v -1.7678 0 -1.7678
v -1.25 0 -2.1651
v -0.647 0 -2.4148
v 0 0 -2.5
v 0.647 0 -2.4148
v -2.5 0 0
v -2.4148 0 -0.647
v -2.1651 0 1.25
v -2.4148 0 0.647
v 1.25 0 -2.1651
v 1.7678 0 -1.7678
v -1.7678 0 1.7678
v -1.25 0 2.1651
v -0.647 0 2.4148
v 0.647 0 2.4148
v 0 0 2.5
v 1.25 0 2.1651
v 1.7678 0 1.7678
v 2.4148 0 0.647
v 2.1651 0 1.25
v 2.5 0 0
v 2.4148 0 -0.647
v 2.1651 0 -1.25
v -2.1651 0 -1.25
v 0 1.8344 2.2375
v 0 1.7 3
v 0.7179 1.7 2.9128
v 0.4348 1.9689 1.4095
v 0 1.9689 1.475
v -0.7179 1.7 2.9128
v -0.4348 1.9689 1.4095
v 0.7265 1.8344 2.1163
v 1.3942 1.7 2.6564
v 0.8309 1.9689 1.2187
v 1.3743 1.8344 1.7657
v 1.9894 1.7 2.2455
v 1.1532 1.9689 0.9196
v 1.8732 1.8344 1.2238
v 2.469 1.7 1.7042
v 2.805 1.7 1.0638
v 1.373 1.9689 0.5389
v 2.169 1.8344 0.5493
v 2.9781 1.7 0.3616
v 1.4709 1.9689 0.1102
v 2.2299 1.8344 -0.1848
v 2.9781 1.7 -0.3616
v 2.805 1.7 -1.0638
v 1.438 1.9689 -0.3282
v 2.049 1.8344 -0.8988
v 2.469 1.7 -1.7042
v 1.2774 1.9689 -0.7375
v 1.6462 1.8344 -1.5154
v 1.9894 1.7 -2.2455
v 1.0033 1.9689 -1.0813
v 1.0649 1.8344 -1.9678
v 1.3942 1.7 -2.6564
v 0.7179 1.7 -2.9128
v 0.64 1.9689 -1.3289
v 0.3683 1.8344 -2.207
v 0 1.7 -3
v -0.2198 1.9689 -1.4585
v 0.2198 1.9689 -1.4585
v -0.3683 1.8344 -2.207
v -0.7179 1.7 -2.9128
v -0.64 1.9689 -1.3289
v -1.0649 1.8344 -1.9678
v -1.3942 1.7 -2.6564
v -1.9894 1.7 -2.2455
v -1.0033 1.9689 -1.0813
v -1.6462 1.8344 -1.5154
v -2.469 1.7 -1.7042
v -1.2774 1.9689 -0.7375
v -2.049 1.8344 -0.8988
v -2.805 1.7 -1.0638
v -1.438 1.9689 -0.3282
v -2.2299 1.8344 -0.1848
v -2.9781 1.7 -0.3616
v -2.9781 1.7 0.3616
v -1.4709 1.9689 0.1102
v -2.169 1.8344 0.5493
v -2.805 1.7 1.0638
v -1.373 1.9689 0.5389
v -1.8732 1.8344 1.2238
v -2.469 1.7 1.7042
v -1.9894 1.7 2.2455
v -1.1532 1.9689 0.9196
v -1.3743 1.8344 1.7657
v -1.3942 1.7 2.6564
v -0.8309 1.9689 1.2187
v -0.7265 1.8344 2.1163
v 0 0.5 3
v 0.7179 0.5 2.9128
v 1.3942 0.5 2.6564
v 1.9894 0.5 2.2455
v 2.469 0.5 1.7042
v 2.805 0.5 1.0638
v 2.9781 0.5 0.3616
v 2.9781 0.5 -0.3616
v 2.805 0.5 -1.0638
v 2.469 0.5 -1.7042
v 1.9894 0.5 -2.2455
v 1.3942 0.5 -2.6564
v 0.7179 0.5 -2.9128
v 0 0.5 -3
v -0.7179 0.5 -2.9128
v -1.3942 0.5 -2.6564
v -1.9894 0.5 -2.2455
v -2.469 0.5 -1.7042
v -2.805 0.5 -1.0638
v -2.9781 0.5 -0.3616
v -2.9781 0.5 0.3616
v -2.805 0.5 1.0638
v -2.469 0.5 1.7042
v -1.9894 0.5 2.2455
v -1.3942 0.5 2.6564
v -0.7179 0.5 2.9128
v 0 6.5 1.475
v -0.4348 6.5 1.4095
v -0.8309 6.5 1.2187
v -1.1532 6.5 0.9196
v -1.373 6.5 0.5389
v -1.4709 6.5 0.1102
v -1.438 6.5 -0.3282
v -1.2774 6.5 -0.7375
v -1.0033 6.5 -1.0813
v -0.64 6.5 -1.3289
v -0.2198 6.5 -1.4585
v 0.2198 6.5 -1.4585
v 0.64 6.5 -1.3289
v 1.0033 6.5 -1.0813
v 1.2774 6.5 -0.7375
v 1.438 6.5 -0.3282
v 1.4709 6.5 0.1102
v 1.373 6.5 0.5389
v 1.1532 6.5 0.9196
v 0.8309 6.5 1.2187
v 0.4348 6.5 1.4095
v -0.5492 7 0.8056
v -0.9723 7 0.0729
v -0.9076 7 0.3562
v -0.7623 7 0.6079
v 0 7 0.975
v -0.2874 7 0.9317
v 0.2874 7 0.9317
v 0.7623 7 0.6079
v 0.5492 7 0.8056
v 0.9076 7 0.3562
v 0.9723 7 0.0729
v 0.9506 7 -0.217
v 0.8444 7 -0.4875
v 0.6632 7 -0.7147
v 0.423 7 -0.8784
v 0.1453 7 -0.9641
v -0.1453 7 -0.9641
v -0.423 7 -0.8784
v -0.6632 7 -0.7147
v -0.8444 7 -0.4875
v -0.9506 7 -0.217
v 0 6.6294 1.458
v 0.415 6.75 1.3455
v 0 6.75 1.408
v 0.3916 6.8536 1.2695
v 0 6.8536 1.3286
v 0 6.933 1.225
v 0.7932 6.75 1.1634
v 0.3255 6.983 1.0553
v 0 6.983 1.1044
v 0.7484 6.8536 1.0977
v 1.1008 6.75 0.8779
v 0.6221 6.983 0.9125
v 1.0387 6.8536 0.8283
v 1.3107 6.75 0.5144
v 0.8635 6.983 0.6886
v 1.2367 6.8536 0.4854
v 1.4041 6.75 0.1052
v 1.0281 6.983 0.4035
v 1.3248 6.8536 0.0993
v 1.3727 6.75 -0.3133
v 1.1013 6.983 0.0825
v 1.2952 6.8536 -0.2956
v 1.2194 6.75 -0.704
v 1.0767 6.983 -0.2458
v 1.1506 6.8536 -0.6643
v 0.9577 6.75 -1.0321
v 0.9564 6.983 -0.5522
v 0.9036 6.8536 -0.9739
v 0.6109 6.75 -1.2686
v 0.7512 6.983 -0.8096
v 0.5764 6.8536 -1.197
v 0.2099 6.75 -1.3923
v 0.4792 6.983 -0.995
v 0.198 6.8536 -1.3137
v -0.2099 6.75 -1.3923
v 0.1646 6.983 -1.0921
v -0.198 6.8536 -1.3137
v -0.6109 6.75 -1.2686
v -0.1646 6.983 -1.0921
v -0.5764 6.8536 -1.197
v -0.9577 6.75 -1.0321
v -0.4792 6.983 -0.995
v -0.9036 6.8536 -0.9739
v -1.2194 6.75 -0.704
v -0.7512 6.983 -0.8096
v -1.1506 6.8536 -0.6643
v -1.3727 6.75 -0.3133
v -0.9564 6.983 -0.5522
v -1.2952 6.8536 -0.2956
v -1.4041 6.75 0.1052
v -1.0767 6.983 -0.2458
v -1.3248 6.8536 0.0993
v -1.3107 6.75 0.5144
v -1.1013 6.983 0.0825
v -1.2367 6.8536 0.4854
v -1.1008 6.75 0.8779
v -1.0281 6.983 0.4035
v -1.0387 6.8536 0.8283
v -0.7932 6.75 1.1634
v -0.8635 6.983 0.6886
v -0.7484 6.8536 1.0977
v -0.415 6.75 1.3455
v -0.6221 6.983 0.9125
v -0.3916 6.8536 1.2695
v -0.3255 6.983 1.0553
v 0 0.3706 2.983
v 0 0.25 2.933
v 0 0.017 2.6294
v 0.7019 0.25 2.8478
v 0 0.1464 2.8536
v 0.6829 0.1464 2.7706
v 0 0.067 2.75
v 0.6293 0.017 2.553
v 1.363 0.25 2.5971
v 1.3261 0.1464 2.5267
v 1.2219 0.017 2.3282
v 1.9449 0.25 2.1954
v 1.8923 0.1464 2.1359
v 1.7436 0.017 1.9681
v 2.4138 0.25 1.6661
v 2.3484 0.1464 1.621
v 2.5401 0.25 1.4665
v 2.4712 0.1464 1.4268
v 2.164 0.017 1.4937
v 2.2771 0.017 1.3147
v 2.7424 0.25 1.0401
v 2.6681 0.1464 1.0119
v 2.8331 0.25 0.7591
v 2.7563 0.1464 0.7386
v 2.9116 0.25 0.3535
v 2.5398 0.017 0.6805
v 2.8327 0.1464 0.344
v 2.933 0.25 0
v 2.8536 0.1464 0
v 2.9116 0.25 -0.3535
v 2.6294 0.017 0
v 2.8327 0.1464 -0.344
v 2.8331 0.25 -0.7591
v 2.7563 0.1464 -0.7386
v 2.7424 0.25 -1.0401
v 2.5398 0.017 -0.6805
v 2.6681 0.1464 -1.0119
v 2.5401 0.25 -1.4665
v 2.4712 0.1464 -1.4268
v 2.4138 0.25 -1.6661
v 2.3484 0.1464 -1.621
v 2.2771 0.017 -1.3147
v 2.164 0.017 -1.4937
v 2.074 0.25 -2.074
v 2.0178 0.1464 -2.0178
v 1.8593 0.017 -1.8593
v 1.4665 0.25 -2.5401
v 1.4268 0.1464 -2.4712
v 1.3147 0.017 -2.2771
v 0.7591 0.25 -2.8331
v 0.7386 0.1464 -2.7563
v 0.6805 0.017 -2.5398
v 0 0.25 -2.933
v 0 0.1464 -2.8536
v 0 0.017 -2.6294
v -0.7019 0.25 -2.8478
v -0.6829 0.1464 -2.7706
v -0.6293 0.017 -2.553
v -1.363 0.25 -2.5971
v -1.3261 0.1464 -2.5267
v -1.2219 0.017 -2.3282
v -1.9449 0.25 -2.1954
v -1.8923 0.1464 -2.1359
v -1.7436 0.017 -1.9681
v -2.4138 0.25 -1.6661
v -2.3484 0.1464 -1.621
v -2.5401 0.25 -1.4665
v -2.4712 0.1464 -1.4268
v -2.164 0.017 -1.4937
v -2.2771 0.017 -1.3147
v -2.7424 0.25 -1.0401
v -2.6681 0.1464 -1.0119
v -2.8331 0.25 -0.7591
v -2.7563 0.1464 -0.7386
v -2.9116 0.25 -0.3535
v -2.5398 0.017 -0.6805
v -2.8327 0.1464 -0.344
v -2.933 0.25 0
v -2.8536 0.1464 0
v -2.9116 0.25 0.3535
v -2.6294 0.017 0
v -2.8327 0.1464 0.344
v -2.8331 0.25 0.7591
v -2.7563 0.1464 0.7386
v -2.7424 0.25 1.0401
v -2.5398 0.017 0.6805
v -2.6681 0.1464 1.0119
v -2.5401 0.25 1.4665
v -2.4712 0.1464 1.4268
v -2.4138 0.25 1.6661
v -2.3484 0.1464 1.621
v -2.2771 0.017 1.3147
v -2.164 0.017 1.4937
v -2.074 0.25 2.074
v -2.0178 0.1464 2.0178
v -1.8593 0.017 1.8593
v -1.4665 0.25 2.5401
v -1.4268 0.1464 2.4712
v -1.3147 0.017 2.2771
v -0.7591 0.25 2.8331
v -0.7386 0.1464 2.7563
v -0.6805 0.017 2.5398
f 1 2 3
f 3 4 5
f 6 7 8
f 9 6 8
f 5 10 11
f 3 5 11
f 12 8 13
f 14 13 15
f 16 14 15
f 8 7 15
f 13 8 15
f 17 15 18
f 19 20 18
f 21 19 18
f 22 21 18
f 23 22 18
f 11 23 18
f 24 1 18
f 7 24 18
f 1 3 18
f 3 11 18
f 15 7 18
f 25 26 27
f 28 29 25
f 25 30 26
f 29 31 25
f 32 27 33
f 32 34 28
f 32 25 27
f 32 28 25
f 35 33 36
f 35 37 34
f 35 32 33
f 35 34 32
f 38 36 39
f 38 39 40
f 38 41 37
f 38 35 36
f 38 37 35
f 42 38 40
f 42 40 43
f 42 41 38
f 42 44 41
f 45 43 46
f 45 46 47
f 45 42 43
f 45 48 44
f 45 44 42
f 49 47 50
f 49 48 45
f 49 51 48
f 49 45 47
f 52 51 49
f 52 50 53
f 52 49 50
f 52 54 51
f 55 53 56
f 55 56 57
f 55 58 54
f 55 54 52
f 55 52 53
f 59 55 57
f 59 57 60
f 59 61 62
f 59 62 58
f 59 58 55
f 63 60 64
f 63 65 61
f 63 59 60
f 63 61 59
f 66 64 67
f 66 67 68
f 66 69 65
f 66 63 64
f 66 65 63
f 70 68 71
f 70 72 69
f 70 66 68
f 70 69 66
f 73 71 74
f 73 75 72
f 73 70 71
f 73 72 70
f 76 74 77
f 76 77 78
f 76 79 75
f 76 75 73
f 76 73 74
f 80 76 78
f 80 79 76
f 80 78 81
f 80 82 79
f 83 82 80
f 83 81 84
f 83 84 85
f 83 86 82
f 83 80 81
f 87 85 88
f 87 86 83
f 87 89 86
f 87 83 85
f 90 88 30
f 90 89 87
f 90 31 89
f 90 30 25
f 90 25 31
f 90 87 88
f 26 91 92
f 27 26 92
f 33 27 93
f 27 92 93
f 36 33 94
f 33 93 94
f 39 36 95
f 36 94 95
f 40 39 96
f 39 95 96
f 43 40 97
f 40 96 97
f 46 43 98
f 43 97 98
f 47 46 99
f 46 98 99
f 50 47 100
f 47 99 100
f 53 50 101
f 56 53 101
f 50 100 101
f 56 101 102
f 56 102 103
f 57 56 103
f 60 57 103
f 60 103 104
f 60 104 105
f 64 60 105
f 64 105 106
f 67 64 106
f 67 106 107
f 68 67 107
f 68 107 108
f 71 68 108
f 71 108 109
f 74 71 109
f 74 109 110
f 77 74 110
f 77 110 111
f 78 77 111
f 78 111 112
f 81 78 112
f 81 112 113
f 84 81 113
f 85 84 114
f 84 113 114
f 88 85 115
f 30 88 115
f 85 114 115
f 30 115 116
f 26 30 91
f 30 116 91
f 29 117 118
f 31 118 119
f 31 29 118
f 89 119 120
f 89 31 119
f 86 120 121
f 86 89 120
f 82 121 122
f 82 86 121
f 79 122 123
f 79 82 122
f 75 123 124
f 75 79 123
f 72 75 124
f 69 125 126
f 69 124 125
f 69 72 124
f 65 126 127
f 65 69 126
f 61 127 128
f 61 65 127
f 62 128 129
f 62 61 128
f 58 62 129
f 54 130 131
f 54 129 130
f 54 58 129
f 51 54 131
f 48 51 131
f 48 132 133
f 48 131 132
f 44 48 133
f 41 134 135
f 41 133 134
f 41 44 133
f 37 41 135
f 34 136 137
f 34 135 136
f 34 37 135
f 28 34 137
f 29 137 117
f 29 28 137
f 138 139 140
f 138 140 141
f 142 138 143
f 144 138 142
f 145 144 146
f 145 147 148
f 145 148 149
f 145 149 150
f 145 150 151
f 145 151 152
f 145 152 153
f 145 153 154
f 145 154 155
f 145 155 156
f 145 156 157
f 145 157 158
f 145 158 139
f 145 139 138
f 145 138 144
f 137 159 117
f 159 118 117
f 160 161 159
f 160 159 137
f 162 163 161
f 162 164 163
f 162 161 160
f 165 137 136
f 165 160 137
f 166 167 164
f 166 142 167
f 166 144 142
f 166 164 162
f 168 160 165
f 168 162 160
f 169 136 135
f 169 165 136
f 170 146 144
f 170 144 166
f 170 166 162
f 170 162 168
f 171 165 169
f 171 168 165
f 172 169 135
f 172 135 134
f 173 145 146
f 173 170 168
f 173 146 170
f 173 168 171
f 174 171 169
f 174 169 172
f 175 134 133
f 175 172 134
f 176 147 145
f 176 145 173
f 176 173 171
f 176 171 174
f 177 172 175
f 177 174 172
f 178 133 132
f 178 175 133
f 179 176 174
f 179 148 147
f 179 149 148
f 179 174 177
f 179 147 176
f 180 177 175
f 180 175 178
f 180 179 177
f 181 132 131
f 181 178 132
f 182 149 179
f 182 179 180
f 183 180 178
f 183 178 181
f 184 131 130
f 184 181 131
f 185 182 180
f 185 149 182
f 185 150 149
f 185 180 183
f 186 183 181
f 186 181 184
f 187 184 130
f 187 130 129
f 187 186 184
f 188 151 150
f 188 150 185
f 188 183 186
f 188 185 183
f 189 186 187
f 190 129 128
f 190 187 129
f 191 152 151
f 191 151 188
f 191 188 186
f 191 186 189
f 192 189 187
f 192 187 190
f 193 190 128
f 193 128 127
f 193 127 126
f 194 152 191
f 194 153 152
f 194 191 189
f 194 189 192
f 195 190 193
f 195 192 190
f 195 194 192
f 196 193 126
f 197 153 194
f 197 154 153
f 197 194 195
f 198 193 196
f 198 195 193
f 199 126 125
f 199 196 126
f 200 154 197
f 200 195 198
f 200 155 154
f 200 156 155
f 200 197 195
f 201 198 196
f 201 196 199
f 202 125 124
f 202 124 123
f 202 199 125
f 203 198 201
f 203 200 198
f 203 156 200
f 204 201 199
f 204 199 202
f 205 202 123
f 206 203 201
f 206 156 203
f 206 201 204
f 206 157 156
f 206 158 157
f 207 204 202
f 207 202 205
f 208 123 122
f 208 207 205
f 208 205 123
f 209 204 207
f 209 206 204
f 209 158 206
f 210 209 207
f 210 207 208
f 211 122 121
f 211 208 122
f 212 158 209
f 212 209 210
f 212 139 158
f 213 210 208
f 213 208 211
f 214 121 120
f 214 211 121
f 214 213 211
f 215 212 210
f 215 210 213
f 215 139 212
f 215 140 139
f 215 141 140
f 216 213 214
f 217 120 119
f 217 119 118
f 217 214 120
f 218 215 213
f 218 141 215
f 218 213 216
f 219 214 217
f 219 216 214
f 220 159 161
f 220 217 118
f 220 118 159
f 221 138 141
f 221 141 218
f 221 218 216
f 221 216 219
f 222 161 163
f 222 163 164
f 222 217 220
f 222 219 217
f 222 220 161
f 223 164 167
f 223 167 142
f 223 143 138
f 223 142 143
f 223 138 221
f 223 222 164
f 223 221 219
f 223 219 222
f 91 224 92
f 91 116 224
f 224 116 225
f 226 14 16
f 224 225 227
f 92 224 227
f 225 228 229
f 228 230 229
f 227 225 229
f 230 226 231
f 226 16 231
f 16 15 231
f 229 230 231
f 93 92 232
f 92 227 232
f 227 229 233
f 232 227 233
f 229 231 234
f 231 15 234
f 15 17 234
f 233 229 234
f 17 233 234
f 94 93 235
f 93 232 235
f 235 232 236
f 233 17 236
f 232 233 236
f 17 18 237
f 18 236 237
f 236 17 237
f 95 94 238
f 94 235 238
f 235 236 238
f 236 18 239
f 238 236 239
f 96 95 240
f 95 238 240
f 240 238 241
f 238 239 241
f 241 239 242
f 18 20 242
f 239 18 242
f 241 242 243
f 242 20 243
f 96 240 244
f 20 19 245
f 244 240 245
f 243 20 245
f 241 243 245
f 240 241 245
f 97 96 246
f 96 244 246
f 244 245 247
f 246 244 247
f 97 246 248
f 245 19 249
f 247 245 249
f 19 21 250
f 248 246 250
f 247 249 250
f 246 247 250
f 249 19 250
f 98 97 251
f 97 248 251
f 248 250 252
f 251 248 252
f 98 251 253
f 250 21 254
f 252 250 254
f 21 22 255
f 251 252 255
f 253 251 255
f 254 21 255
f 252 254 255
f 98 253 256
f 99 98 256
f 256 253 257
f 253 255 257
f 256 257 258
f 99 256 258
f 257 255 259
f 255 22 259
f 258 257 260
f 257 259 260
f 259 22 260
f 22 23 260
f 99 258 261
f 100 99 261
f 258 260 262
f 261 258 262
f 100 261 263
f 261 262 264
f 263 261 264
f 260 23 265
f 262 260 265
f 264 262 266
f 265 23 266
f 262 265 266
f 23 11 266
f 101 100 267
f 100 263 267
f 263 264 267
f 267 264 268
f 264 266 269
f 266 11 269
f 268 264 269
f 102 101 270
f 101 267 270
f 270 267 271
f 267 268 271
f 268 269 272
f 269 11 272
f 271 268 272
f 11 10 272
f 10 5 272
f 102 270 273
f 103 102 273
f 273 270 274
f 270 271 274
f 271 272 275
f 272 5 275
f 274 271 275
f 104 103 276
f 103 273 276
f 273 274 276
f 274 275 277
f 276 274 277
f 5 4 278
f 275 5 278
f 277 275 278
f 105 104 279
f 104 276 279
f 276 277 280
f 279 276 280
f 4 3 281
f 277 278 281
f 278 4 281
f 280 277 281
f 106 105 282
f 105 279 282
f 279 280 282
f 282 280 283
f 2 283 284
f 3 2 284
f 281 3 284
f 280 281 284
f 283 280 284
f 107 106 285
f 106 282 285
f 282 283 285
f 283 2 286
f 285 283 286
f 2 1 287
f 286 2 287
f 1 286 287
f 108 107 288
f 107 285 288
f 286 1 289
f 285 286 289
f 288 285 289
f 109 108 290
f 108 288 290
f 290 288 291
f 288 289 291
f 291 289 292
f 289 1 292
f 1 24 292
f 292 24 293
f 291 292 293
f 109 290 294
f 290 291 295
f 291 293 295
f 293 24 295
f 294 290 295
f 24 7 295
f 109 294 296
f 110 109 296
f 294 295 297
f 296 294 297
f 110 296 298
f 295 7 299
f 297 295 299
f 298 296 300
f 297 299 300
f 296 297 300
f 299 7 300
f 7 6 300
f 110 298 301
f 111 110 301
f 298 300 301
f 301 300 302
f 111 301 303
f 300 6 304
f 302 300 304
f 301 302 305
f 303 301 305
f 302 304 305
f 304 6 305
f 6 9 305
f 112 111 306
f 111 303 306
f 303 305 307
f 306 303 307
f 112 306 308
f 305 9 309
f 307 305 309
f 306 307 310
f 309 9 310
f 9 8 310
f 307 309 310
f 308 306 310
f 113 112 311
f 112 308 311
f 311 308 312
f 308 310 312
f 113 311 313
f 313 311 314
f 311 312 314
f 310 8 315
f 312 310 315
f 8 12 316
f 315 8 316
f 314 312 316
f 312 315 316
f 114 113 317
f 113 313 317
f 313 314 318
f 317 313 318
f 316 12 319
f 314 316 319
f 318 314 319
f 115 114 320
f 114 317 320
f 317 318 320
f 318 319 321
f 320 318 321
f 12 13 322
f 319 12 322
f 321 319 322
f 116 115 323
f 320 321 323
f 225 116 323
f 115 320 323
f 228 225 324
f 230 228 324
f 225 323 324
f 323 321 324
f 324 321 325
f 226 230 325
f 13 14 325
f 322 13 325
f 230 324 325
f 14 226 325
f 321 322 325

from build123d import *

# Parameters (mm, degrees)
CROQUIS1_R              = 3
SALIENTE_EXTRUIR1_DEPTH = 2
CROQUIS2_R              = 1.475
SALIENTE_EXTRUIR2_DEPTH = 5
CHAFL_N1_SIZE           = 0.3
CHAFL_N1_SIZE_2         = 1.701384546
REDONDEO1_R             = 0.5
REDONDEO2_R             = 0.5


with BuildPart() as part:
    # Croquis1 → Saliente-Extruir1 (new body)
    with BuildSketch(Plane(origin=(0, 0, 0), x_dir=(1, 0, 0), z_dir=(0, 1, 0))):
        with Locations(Location((0, 0, 0), (0, 0, 270))):
            Circle(CROQUIS1_R)
    extrude(amount=SALIENTE_EXTRUIR1_DEPTH)

    # Croquis2 → Saliente-Extruir2 (add)
    with BuildSketch(Plane(origin=(0, 2, 0), x_dir=(1, 0, 0), z_dir=(0, 1, 0))):
        with Locations(Location((0, 0, 0), (0, 0, 270))):
            Circle(CROQUIS2_R)
    extrude(amount=SALIENTE_EXTRUIR2_DEPTH)

    # Chaflán1
    # the kernel refuses this chamfer: 1.701384546, 0.3 mm, written as the material it takes off along each edge
    with BuildSketch(Plane(origin=(0, 2, 0), x_dir=(0, 0, 1), z_dir=(-1, 0, 0))) as chafl_n1_piece_1_section:
        Polygon((3, -CHAFL_N1_SIZE), (3 - CHAFL_N1_SIZE_2, 0), (3, 0), align=None)
    chafl_n1_piece_1 = revolve(axis=Axis((0, 2, 0), (0, 1, 0)), mode=Mode.PRIVATE)
    chafl_n1_piece_1 = chafl_n1_piece_1 - Plane(origin=(0, 1.84524898, 0), x_dir=(0, 0, 1), z_dir=(0, -1, 0)) * Cylinder(1.475, 12, mode=Mode.PRIVATE)
    add(chafl_n1_piece_1, mode=Mode.SUBTRACT)

    # Redondeo1
    redondeo1_edges = [part.edges().sort_by_distance(p)[0] for p in [
        (0, 7, -1.475),
    ]]
    fillet(redondeo1_edges, radius=REDONDEO1_R)

    # Redondeo2
    redondeo2_edges = [part.edges().sort_by_distance(p)[0] for p in [
        (0, 0, -3),
    ]]
    fillet(redondeo2_edges, radius=REDONDEO2_R)


solid = part.part
